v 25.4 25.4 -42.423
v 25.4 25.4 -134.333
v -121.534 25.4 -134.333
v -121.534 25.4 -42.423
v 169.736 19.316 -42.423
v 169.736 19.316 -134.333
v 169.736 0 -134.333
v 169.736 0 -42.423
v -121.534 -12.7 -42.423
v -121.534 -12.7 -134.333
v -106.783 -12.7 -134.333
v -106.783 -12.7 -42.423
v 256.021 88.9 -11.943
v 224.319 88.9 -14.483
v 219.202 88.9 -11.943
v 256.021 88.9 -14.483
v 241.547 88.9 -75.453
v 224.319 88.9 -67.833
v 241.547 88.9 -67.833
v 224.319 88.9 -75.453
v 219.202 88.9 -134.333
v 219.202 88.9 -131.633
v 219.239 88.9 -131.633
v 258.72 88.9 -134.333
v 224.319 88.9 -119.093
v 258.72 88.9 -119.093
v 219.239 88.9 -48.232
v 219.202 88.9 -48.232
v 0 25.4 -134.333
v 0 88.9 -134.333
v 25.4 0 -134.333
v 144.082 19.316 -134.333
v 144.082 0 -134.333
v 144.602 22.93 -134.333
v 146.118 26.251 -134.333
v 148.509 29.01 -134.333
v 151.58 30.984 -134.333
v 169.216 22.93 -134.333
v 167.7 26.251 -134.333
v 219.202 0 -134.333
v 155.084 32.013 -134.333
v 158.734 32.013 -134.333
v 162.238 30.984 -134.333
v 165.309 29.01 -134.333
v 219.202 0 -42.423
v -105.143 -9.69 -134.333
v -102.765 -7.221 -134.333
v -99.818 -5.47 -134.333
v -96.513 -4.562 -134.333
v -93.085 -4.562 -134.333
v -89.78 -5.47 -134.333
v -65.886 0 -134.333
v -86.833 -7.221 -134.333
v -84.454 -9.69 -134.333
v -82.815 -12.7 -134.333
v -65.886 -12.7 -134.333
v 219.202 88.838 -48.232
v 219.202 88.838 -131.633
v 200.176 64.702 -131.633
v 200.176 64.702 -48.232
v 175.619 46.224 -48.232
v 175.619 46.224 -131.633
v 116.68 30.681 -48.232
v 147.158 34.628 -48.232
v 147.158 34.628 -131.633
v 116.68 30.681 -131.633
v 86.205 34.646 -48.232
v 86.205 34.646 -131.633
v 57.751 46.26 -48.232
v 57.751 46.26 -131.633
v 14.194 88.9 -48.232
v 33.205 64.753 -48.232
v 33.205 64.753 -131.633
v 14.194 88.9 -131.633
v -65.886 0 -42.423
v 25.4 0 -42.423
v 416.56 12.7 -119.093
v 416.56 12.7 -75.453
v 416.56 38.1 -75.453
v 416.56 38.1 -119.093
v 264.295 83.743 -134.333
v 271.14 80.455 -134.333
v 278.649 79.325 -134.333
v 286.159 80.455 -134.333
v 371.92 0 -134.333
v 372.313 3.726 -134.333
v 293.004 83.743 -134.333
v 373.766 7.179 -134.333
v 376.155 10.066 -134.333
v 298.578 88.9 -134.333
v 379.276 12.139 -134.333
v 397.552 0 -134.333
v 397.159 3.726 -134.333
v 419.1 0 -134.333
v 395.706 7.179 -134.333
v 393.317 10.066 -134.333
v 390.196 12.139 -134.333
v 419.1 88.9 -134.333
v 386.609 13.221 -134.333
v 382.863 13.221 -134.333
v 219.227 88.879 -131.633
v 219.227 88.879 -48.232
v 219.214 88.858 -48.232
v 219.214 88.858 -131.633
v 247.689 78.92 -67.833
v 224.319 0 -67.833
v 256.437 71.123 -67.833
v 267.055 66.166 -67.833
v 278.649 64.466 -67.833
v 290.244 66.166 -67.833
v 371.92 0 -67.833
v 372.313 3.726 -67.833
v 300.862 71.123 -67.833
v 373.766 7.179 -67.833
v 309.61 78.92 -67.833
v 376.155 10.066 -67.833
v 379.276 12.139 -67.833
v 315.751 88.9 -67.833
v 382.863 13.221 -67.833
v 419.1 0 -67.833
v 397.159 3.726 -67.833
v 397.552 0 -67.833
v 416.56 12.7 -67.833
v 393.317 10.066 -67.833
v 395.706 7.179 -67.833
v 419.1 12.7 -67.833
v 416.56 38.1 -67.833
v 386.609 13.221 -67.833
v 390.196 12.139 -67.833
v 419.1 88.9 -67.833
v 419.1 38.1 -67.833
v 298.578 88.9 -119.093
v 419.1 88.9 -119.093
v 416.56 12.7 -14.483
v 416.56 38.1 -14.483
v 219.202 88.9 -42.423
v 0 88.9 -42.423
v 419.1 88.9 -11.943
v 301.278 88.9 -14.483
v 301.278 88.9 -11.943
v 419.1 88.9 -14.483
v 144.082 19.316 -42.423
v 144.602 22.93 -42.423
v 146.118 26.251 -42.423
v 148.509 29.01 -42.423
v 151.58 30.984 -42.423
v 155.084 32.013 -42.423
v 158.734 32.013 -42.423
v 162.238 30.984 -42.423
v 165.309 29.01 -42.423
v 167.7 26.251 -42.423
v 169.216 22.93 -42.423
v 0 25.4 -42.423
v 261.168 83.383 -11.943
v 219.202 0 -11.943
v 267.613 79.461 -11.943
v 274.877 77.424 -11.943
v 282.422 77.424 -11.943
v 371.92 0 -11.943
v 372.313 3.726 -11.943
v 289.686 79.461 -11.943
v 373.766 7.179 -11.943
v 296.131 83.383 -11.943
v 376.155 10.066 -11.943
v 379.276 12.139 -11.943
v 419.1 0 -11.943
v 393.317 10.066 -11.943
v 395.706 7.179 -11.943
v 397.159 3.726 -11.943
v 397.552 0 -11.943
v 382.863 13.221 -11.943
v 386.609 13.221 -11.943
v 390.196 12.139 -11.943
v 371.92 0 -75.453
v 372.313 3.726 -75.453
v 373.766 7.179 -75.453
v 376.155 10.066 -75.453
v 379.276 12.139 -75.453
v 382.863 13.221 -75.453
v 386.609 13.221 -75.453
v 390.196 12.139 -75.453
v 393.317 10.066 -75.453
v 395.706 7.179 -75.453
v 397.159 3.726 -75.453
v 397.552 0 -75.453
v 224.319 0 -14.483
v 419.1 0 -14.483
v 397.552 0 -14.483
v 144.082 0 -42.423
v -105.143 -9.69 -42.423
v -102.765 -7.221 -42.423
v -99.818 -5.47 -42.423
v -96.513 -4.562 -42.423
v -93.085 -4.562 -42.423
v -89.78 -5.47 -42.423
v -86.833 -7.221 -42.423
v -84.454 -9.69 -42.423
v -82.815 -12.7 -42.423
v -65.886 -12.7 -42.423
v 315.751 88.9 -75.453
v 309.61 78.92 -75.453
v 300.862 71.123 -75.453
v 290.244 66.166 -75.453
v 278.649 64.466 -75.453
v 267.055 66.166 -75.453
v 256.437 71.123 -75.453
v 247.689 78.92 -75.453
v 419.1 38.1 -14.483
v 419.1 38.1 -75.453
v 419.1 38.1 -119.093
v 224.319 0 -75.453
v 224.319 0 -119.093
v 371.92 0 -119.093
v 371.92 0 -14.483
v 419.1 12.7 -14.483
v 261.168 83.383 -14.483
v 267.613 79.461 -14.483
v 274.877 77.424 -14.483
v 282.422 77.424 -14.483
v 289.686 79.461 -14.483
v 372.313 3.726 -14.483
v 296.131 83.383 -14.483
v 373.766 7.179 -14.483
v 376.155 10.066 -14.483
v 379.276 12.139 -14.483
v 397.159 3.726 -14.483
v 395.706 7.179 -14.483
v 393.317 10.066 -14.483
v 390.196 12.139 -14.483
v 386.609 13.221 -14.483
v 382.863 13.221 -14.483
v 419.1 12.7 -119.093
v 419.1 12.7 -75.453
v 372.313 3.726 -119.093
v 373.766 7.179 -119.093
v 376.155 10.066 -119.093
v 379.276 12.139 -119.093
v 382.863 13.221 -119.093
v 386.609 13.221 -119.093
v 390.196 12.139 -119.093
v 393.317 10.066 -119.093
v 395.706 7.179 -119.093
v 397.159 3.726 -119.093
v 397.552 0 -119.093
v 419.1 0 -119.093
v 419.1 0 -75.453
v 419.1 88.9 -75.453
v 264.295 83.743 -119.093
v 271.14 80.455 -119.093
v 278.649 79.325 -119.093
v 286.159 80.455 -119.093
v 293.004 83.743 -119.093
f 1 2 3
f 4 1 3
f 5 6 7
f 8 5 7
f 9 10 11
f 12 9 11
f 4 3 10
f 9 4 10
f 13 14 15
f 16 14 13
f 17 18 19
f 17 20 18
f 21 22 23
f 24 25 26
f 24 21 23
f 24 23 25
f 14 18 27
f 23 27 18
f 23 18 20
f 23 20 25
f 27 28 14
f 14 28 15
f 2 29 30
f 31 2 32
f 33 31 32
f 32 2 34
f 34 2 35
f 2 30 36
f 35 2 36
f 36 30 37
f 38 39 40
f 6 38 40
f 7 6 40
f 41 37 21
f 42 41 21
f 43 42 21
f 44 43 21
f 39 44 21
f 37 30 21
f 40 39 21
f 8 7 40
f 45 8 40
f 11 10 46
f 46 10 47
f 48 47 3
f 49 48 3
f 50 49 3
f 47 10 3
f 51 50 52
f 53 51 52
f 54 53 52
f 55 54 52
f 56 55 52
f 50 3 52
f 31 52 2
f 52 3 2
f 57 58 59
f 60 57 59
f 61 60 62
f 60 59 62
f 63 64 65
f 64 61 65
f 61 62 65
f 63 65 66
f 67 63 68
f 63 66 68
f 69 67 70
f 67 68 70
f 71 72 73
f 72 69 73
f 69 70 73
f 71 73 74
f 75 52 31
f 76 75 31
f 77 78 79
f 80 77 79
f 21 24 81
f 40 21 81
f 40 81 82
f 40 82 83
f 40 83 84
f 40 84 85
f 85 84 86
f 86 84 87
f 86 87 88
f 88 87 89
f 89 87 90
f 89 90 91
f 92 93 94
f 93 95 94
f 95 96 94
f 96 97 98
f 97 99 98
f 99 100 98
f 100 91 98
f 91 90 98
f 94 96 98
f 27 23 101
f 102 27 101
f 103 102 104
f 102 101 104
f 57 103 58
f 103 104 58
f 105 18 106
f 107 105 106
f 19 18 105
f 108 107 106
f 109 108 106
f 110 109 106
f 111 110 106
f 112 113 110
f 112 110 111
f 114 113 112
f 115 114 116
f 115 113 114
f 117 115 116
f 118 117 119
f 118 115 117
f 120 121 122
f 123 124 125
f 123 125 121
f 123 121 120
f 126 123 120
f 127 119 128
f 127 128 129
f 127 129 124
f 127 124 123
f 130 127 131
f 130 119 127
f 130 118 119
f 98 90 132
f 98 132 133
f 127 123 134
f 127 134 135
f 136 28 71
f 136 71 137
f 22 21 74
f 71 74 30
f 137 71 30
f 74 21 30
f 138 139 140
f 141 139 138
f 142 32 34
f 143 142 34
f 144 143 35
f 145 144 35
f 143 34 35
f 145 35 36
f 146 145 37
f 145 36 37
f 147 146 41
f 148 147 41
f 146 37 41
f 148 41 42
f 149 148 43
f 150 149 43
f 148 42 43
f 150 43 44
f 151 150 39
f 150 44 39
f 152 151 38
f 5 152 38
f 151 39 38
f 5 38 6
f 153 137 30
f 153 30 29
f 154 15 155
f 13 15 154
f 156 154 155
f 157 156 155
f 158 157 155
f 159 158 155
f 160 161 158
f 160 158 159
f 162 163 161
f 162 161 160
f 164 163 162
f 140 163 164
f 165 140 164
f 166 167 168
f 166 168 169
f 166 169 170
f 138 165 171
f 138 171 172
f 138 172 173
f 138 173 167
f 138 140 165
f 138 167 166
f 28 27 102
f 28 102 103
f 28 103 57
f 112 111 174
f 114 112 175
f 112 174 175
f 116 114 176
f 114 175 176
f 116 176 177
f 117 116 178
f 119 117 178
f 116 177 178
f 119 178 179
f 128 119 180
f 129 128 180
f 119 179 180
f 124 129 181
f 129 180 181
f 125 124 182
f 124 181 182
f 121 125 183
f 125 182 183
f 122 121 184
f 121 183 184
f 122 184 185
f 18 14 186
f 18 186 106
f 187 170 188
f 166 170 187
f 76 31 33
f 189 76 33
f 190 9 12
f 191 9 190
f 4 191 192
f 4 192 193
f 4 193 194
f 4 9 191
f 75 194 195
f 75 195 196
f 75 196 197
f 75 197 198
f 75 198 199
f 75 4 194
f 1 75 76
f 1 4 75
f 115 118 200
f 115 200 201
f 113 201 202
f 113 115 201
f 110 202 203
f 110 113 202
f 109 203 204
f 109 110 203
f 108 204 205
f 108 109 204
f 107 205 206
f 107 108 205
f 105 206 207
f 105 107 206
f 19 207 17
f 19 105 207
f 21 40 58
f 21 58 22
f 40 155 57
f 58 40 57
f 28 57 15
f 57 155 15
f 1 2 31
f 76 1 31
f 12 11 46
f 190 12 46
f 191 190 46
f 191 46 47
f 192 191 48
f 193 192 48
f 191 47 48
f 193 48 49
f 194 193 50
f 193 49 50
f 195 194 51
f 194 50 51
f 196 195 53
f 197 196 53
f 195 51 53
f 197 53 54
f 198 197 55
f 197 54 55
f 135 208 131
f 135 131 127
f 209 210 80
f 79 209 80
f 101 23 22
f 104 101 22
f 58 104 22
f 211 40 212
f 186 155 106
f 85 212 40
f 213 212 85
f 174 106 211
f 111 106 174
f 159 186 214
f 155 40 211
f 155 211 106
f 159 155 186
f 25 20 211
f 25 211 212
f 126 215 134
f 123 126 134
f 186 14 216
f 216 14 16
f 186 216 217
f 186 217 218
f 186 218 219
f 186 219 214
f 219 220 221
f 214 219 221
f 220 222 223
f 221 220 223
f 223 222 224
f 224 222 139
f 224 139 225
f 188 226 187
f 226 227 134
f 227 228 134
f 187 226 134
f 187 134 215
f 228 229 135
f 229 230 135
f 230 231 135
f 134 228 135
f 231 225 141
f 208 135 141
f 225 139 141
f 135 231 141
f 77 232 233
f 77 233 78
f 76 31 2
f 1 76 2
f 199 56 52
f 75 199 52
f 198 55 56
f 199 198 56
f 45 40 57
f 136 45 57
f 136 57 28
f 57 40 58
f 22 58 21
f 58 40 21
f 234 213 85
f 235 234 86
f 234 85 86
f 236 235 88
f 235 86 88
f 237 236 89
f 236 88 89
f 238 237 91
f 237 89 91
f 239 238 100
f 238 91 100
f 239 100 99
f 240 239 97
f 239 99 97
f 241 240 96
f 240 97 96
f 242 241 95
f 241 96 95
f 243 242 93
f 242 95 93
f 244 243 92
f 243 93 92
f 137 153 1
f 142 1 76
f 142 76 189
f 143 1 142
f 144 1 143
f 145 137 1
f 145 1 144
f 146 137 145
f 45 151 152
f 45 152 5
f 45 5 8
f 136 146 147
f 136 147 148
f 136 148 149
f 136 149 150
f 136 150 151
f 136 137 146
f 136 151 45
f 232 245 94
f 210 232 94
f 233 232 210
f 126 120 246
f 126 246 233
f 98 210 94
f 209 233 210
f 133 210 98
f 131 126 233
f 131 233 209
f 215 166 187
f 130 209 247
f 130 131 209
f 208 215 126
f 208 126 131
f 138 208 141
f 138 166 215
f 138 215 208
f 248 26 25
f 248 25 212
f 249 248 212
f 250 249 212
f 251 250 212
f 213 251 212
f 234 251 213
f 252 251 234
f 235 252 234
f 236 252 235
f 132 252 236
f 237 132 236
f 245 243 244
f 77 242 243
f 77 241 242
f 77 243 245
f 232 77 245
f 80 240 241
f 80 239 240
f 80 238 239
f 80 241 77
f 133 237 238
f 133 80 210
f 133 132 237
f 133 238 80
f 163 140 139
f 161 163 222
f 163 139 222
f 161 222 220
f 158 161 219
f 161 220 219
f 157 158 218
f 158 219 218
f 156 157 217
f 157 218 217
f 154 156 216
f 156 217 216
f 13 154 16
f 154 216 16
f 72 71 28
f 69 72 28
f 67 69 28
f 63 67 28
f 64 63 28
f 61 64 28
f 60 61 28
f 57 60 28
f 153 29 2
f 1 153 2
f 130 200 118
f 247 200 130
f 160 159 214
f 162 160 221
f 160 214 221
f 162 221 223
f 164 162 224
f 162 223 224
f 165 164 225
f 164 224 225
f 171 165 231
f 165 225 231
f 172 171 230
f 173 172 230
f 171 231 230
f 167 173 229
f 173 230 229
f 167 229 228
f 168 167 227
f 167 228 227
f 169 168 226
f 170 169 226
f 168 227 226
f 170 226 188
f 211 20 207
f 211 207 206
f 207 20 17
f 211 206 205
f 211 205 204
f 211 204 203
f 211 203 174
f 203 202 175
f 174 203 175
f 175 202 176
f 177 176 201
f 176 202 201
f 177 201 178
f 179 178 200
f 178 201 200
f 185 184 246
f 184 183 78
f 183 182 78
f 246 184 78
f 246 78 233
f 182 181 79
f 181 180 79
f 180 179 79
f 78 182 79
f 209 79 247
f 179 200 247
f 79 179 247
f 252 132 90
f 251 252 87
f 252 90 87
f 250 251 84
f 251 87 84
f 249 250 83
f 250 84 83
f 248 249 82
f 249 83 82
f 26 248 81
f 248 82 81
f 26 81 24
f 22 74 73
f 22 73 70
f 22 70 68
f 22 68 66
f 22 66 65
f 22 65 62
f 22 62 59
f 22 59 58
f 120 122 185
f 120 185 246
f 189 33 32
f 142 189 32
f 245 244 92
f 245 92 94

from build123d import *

# Parameters (mm, degrees)
SKETCH1_W           = 419.1
SKETCH1_H           = 142.18412
BOSS_EXTRUDE1_DEPTH = 88.9
SKETCH2_R           = 119.38
CUT_EXTRUDE1_DEPTH  = 83.4009
SKETCH7_W           = 194.780719179
SKETCH7_H           = 43.63974
SKETCH7_H_2         = 53.35016
CUT_EXTRUDE2_DEPTH  = 452.402640644
SKETCH4_R           = 40.386
CUT_EXTRUDE4_DEPTH  = 10
SKETCH18_R          = 25.527
CUT_EXTRUDE11_DEPTH = 23.09114
SKETCH5_R           = 27.686
CUT_EXTRUDE5_DEPTH  = 14.48308
SKETCH8_W           = 419.1
SKETCH8_H           = 88.9
CUT_EXTRUDE6_DEPTH  = 7.85114
SKETCH9_W           = 419.1
SKETCH9_H           = 88.9
CUT_EXTRUDE7_DEPTH  = 11.94308
SKETCH10_W          = 219.202
SKETCH10_H          = 88.9
CUT_EXTRUDE8_DEPTH  = 30.48
SKETCH12_W          = 121.533574186
SKETCH12_H          = 91.9099
BOSS_EXTRUDE2_DEPTH = 25.4
SKETCH14_W          = 55.647095764
SKETCH14_H          = 91.9099
BOSS_EXTRUDE3_DEPTH = 12.7
SKETCH17_R          = 12.827
CUT_EXTRUDE10_DEPTH = 446.564033133
SKETCH20_W          = 2.54
SKETCH20_H          = 25.4
BOSS_EXTRUDE4_DEPTH = 104.6099
SPLIT2_START        = -121.533574186
SPLIT2_DEPTH        = 340.735574186
SPLIT2_START_2      = -134.33298
SPLIT2_2_DEPTH      = 91.9099
SPLIT2_START_3      = -48.23206
SPLIT2_3_DEPTH      = 5.80898
SPLIT2_4_DEPTH      = 2.70002
SPLIT2_5_DEPTH      = 91.9099


# Read off the part's stored shape, not the designer's step: Split2
with BuildPart() as part:
    # Sketch1 → Boss-Extrude1 (new body)
    with BuildSketch(Plane(origin=(0, 0, 0), x_dir=(1, 0, 0), z_dir=(0, 1, 0))):
        with Locations((209.55, 71.09206)):
            Rectangle(SKETCH1_W, SKETCH1_H)
    extrude(amount=BOSS_EXTRUDE1_DEPTH)

    # Sketch2 → Cut-Extrude1 (cut)
    with BuildSketch(Plane(origin=(0, 0, -131.63296), x_dir=(-1, 0, 0), z_dir=(0, 0, -1))):
        with Locations((-116.7166499, 150.061217688)):
            Circle(SKETCH2_R)
    extrude(amount=-CUT_EXTRUDE1_DEPTH, mode=Mode.SUBTRACT)

    # Sketch7 → Cut-Extrude2 (cut, through all)
    with BuildSketch(Plane(origin=(0, 88.9, 0), x_dir=(1, 0, 0), z_dir=(0, 1, 0))):
        with Locations((321.709640411, 97.27311)):
            Rectangle(SKETCH7_W, SKETCH7_H)
        with Locations((321.709640411, 41.15816)):
            Rectangle(SKETCH7_W, SKETCH7_H_2)
    extrude(amount=-CUT_EXTRUDE2_DEPTH, mode=Mode.SUBTRACT)

    # Sketch4 → Cut-Extrude4 (cut)
    with BuildSketch(Plane(origin=(0, 0, -67.83324), x_dir=(-1, 0, 0), z_dir=(0, 0, -1))):
        with Locations((-278.649352085, 104.852009966)):
            Circle(SKETCH4_R)
    extrude(amount=CUT_EXTRUDE4_DEPTH, mode=Mode.SUBTRACT)

    # Sketch18 → Cut-Extrude11 (cut)
    with BuildSketch(Plane(origin=(0, 0, -142.18412), x_dir=(-1, 0, 0), z_dir=(0, 0, -1))):
        with Locations((-278.649352085, 104.852009966)):
            Circle(SKETCH18_R)
    extrude(amount=-CUT_EXTRUDE11_DEPTH, mode=Mode.SUBTRACT)

    # Sketch5 → Cut-Extrude5 (cut)
    with BuildSketch(Plane(origin=(0, 0, -14.48308), x_dir=(-1, 0, 0), z_dir=(0, 0, -1))):
        with Locations((-278.649352085, 104.852009966)):
            Circle(SKETCH5_R)
    extrude(amount=-CUT_EXTRUDE5_DEPTH, mode=Mode.SUBTRACT)

    # Sketch8 → Cut-Extrude6 (cut)
    with BuildSketch(Plane(origin=(0, 0, -142.18412), x_dir=(-1, 0, 0), z_dir=(0, 0, -1))):
        with Locations((-209.55, 44.45)):
            Rectangle(SKETCH8_W, SKETCH8_H)
    extrude(amount=-CUT_EXTRUDE6_DEPTH, mode=Mode.SUBTRACT)

    # Sketch9 → Cut-Extrude7 (cut)
    with BuildSketch(Plane.XY):
        with Locations((209.55, 44.45)):
            Rectangle(SKETCH9_W, SKETCH9_H)
    extrude(amount=-CUT_EXTRUDE7_DEPTH, mode=Mode.SUBTRACT)

    # Sketch10 → Cut-Extrude8 (cut)
    with BuildSketch(Plane.XY.offset(-11.94308)):
        with Locations((109.601, 44.45)):
            Rectangle(SKETCH10_W, SKETCH10_H)
    extrude(amount=-CUT_EXTRUDE8_DEPTH, mode=Mode.SUBTRACT)

    # Sketch12 → Boss-Extrude2 (add)
    with BuildSketch(Plane.XZ):
        with Locations((-60.766787093, -88.37803)):
            Rectangle(SKETCH12_W, SKETCH12_H)
    extrude(amount=-BOSS_EXTRUDE2_DEPTH)

    # Sketch14 → Boss-Extrude3 (add)
    with BuildSketch(Plane.XZ):
        with Locations((-93.710026304, -88.37803)):
            Rectangle(SKETCH14_W, SKETCH14_H)
    extrude(amount=BOSS_EXTRUDE3_DEPTH)

    # Sketch17 → Cut-Extrude10 (cut, through all)
    with BuildSketch(Plane(origin=(0, 0, -134.33298), x_dir=(-1, 0, 0), z_dir=(0, 0, -1))):
        with Locations((-384.735935495, 0.531880938)):
            Circle(SKETCH17_R)
        with Locations((94.798916194, -17.274045482)):
            Circle(SKETCH17_R)
        with BuildLine():
            Line((-169.736021607, 19.31637742), (-169.736021607, 0))
            Line((-169.736021607, 0), (-144.082021607, 0))
            Line((-144.082021607, 0), (-144.082021607, 19.31637742))
            ThreePointArc((-144.082021607, 19.31637742), (-156.909021607, 32.14337742), (-169.736021607, 19.31637742))
        make_face()
    extrude(amount=-CUT_EXTRUDE10_DEPTH, mode=Mode.SUBTRACT)

    # Sketch20 → Boss-Extrude4 (add)
    with BuildSketch(Plane(origin=(0, 0, -14.48308), x_dir=(-1, 0, 0), z_dir=(0, 0, -1))):
        with Locations((-417.83, 25.4)):
            Rectangle(SKETCH20_W, SKETCH20_H)
    extrude(amount=BOSS_EXTRUDE4_DEPTH)

    # Split2 outline → Split2 (cut)
    with BuildSketch(Plane.YZ.offset(SPLIT2_START)):
        Polygon((-12.7, -42.42308), (-12.7, -134.33298), (88.9, -134.33298), (88.9, -131.63296), (88.9, -48.23206), (88.9, -42.42308), align=None)
    extrude(amount=SPLIT2_DEPTH, mode=Mode.SUBTRACT)


with BuildPart() as body_2:
    # Split2 2 outline → Split2 2 (new body)
    with BuildSketch(Plane.XY.offset(SPLIT2_START_2)):
        with BuildLine():
            Line((219.202, 0), (219.202, 88.837550574))
            ThreePointArc((219.202, 88.837550574), (116.680284427, 30.681223227), (14.194018979, 88.9))
            Line((14.194018979, 88.9), (0, 88.9))
            Line((0, 88.9), (0, 25.4))
            Line((0, 25.4), (25.4, 25.4))
            Line((25.4, 25.4), (25.4, 0))
            Line((25.4, 0), (144.082021607, 0))
            Line((144.082021607, 0), (144.082021607, 19.31637742))
            ThreePointArc((144.082021607, 19.31637742), (156.909021607, 32.14337742), (169.736021607, 19.31637742))
            Line((169.736021607, 19.31637742), (169.736021607, 0))
            Line((169.736021607, 0), (219.202, 0))
        make_face()
    extrude(amount=SPLIT2_2_DEPTH)

    # Split2 3 outline → Split2 3 (add)
    with BuildSketch(Plane.XY.offset(SPLIT2_START_3)):
        with BuildLine():
            Line((219.202, 88.837550574), (219.202, 88.9))
            Line((219.202, 88.9), (14.194018979, 88.9))
            ThreePointArc((14.194018979, 88.9), (116.680284427, 30.681223227), (219.202, 88.837550574))
        make_face()
    extrude(amount=SPLIT2_3_DEPTH)

    # Split2 4 outline → Split2 4 (add)
    with BuildSketch(Plane.XY.offset(SPLIT2_START_2)):
        with BuildLine():
            Line((219.202, 88.837550574), (219.202, 88.9))
            Line((219.202, 88.9), (14.194018979, 88.9))
            ThreePointArc((14.194018979, 88.9), (116.680284427, 30.681223227), (219.202, 88.837550574))
        make_face()
    extrude(amount=SPLIT2_4_DEPTH)


with BuildPart() as body_3:
    # Split2 5 outline → Split2 5 (new body)
    with BuildSketch(Plane.XY.offset(SPLIT2_START_2)):
        with BuildLine():
            Line((25.4, 0), (25.4, 25.4))
            Line((25.4, 25.4), (-121.533574186, 25.4))
            Line((-121.533574186, 25.4), (-121.533574186, -12.7))
            Line((-121.533574186, -12.7), (-106.782656717, -12.7))
            ThreePointArc((-106.782656717, -12.7), (-94.798916194, -4.447045482), (-82.815175671, -12.7))
            Line((-82.815175671, -12.7), (-65.886478422, -12.7))
            Line((-65.886478422, -12.7), (-65.886478422, 0))
            Line((-65.886478422, 0), (25.4, 0))
        make_face()
    extrude(amount=SPLIT2_5_DEPTH)


solid = Compound([part.part, body_2.part, body_3.part])
